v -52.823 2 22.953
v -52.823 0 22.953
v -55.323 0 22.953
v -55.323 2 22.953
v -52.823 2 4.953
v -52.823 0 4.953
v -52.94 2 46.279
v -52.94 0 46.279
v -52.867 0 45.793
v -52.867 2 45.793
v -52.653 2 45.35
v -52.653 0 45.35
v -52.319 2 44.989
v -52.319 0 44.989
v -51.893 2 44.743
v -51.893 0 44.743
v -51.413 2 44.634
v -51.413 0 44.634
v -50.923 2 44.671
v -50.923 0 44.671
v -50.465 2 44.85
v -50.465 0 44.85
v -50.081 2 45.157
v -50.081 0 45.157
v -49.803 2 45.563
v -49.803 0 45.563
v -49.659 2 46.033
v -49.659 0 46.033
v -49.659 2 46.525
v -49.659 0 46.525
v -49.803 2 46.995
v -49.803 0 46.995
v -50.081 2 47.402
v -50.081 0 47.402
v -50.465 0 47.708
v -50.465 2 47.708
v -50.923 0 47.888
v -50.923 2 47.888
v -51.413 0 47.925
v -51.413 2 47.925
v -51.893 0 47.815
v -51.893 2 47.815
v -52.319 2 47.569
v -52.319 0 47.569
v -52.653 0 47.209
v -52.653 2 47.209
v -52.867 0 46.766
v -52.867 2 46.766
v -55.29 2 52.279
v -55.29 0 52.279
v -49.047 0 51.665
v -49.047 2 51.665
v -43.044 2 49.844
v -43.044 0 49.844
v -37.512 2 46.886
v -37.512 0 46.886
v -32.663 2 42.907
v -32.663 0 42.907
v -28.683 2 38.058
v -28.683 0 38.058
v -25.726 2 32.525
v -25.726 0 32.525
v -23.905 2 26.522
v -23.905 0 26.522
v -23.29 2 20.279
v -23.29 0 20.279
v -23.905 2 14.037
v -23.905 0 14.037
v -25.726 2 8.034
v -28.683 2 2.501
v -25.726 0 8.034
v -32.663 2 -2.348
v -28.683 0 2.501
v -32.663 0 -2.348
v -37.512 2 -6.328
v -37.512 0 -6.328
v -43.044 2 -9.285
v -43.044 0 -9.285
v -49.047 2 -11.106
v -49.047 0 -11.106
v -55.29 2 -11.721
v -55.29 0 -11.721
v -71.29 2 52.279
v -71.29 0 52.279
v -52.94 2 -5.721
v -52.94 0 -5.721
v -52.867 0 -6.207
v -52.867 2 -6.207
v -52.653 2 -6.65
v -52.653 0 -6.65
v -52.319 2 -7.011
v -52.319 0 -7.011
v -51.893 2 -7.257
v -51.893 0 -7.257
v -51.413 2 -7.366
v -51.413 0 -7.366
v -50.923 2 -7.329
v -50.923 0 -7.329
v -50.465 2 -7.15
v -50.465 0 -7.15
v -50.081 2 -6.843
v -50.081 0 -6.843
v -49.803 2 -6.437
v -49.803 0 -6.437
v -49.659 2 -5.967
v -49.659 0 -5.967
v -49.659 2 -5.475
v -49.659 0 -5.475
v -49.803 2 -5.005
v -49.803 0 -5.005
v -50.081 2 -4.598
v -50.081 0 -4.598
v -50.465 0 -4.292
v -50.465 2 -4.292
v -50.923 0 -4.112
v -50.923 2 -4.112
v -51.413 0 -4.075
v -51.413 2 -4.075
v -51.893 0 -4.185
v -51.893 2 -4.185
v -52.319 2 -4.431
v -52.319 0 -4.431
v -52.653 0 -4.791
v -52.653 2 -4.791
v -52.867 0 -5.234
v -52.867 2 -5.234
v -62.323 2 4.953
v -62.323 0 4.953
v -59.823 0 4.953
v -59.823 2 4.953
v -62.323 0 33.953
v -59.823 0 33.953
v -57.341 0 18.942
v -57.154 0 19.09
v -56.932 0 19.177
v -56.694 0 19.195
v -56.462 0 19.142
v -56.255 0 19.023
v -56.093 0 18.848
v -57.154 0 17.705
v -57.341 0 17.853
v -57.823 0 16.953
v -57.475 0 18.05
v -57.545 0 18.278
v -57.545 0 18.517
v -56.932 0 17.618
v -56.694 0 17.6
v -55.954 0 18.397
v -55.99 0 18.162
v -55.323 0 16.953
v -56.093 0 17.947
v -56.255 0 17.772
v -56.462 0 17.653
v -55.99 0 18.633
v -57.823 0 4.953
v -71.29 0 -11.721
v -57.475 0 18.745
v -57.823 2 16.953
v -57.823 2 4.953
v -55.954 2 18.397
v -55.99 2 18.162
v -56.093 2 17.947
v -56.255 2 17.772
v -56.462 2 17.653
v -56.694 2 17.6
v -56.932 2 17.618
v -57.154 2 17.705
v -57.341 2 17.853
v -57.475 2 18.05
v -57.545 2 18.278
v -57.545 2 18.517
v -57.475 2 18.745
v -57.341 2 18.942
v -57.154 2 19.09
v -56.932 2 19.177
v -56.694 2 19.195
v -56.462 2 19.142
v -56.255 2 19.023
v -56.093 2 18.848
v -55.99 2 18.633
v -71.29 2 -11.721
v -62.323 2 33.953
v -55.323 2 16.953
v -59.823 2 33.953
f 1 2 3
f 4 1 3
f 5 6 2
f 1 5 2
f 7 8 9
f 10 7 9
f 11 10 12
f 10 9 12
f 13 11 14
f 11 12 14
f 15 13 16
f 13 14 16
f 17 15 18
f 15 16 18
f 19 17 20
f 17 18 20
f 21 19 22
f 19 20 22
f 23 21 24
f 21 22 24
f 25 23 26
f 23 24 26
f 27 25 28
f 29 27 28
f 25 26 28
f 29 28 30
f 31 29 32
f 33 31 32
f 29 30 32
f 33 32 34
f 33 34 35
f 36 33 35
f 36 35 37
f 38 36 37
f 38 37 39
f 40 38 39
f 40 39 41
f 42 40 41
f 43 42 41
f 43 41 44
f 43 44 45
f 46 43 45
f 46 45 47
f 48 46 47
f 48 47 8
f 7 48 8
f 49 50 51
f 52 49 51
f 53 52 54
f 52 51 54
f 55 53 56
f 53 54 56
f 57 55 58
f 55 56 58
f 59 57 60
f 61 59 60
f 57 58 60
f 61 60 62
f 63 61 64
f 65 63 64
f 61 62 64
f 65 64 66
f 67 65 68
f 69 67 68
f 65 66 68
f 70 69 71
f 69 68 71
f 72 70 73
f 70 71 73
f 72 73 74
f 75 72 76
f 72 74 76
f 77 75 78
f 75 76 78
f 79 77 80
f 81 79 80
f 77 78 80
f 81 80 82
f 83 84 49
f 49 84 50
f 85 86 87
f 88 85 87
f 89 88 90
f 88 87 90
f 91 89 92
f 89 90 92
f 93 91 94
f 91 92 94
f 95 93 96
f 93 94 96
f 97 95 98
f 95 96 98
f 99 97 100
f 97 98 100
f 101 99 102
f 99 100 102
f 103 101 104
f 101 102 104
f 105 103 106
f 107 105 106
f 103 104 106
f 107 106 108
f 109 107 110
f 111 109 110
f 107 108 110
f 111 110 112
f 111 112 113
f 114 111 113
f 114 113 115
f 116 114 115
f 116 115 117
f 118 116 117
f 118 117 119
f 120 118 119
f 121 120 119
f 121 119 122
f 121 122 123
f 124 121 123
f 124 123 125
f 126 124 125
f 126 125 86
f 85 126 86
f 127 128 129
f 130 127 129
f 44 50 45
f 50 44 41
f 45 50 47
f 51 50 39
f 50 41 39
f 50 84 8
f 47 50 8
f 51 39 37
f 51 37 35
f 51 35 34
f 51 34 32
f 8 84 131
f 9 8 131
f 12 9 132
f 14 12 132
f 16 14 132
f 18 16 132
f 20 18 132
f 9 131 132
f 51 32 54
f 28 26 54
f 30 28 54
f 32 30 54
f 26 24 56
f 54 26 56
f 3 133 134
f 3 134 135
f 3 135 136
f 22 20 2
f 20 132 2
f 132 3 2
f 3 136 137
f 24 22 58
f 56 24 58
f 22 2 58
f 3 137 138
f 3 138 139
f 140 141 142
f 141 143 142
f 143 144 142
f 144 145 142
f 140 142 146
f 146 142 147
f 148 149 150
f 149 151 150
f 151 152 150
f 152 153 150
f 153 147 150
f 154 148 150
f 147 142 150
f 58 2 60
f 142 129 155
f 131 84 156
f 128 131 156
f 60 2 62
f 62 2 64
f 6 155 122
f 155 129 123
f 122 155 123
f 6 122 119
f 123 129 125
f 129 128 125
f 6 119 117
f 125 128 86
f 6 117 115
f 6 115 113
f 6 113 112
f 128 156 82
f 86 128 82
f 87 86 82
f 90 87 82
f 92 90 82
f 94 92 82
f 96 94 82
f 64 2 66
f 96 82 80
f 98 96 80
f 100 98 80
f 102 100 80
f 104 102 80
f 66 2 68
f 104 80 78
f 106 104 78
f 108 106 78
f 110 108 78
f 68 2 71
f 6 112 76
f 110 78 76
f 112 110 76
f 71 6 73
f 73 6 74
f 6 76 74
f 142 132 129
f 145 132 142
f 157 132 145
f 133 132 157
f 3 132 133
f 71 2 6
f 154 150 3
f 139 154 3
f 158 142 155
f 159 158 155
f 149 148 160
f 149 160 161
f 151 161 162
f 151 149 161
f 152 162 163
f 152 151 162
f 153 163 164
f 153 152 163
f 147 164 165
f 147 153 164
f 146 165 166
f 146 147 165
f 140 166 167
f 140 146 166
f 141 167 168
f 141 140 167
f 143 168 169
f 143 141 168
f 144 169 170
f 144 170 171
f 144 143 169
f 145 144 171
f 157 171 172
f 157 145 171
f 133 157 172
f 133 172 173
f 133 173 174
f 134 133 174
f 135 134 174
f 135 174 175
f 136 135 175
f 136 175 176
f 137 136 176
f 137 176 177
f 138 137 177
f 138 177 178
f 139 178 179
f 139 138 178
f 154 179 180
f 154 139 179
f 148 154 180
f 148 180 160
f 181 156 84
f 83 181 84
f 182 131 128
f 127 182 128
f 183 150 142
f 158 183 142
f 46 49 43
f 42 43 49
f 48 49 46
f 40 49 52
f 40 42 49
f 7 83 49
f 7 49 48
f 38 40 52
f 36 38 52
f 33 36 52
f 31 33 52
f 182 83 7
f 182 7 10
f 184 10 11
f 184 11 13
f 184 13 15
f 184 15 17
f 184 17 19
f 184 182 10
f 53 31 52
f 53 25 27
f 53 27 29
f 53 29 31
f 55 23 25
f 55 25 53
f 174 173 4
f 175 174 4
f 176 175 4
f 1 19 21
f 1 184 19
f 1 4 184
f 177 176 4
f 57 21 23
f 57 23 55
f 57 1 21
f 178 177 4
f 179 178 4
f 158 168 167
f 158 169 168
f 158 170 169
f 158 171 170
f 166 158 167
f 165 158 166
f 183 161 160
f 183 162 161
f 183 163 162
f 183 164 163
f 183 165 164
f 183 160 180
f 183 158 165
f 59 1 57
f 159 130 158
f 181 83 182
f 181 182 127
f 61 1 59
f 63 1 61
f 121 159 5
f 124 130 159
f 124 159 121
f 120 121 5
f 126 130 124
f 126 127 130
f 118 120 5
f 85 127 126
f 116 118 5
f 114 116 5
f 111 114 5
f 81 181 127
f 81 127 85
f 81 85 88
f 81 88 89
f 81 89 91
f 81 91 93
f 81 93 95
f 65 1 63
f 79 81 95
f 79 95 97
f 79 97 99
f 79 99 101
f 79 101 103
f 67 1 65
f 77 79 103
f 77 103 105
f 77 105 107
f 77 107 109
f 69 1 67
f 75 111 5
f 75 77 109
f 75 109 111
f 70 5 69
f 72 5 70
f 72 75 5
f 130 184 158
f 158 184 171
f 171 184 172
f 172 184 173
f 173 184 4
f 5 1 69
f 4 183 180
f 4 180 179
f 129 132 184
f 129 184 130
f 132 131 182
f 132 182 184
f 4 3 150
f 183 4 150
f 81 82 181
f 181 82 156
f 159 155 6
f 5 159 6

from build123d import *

# Parameters (mm, degrees)
CROQUIS2_W                = 2.5
CROQUIS2_H                = 29
CROQUIS2_R                = 0.8
SALIENTE_EXTRUIR2_DEPTH   = 2
TALADRO_ROSCADO_M41_D     = 3.3
TALADRO_ROSCADO_M41_DEPTH = 11.5
TALADRO_ROSCADO_M41_TIP   = 0.991420021


with BuildPart() as part:
    # Croquis2 → Saliente-Extruir2 (new body)
    with BuildSketch(Plane(origin=(0, 0, 0), x_dir=(1, 0, 0), z_dir=(0, 1, 0))):
        with BuildLine():
            Line((-69.290093462, 11.720598128), (-71.290093462, 11.720598128))
            Line((-71.290093462, 11.720598128), (-71.290093462, -52.279401872))
            Line((-71.290093462, -52.279401872), (-55.290093462, -52.279401872))
            ThreePointArc((-55.290093462, -52.279401872), (-23.290093462, -20.279401872), (-55.290093462, 11.720598128))
            Line((-55.290093462, 11.720598128), (-69.290093462, 11.720598128))
        make_face()
        with Locations((-61.073318824, -19.453109229)):
            Rectangle(CROQUIS2_W, CROQUIS2_H, mode=Mode.SUBTRACT)
        with Locations((-56.754226246, -18.397495979)):
            Circle(CROQUIS2_R, mode=Mode.SUBTRACT)
        Polygon((-57.823318824, -16.953109229), (-57.823318824, -4.953109229), (-52.823318824, -4.953109229), (-52.823318824, -22.953109229), (-55.323318824, -22.953109229), (-55.323318824, -16.953109229), align=None, mode=Mode.SUBTRACT)
    extrude(amount=SALIENTE_EXTRUIR2_DEPTH)

    # Taladro roscado M41
    with Locations(Plane(origin=(0, 2, 0), x_dir=(1, 0, 0), z_dir=(0, 1, 0))):
        with Locations((-51.290093462, 5.720598128), (-51.290093462, -46.279401872)):
            Hole(TALADRO_ROSCADO_M41_D / 2, depth=TALADRO_ROSCADO_M41_DEPTH)
            with Locations((0, 0, -(TALADRO_ROSCADO_M41_DEPTH + TALADRO_ROSCADO_M41_TIP / 2))):  # 118° drill point
                Cone(0, TALADRO_ROSCADO_M41_D / 2, TALADRO_ROSCADO_M41_TIP, mode=Mode.SUBTRACT)


solid = part.part
